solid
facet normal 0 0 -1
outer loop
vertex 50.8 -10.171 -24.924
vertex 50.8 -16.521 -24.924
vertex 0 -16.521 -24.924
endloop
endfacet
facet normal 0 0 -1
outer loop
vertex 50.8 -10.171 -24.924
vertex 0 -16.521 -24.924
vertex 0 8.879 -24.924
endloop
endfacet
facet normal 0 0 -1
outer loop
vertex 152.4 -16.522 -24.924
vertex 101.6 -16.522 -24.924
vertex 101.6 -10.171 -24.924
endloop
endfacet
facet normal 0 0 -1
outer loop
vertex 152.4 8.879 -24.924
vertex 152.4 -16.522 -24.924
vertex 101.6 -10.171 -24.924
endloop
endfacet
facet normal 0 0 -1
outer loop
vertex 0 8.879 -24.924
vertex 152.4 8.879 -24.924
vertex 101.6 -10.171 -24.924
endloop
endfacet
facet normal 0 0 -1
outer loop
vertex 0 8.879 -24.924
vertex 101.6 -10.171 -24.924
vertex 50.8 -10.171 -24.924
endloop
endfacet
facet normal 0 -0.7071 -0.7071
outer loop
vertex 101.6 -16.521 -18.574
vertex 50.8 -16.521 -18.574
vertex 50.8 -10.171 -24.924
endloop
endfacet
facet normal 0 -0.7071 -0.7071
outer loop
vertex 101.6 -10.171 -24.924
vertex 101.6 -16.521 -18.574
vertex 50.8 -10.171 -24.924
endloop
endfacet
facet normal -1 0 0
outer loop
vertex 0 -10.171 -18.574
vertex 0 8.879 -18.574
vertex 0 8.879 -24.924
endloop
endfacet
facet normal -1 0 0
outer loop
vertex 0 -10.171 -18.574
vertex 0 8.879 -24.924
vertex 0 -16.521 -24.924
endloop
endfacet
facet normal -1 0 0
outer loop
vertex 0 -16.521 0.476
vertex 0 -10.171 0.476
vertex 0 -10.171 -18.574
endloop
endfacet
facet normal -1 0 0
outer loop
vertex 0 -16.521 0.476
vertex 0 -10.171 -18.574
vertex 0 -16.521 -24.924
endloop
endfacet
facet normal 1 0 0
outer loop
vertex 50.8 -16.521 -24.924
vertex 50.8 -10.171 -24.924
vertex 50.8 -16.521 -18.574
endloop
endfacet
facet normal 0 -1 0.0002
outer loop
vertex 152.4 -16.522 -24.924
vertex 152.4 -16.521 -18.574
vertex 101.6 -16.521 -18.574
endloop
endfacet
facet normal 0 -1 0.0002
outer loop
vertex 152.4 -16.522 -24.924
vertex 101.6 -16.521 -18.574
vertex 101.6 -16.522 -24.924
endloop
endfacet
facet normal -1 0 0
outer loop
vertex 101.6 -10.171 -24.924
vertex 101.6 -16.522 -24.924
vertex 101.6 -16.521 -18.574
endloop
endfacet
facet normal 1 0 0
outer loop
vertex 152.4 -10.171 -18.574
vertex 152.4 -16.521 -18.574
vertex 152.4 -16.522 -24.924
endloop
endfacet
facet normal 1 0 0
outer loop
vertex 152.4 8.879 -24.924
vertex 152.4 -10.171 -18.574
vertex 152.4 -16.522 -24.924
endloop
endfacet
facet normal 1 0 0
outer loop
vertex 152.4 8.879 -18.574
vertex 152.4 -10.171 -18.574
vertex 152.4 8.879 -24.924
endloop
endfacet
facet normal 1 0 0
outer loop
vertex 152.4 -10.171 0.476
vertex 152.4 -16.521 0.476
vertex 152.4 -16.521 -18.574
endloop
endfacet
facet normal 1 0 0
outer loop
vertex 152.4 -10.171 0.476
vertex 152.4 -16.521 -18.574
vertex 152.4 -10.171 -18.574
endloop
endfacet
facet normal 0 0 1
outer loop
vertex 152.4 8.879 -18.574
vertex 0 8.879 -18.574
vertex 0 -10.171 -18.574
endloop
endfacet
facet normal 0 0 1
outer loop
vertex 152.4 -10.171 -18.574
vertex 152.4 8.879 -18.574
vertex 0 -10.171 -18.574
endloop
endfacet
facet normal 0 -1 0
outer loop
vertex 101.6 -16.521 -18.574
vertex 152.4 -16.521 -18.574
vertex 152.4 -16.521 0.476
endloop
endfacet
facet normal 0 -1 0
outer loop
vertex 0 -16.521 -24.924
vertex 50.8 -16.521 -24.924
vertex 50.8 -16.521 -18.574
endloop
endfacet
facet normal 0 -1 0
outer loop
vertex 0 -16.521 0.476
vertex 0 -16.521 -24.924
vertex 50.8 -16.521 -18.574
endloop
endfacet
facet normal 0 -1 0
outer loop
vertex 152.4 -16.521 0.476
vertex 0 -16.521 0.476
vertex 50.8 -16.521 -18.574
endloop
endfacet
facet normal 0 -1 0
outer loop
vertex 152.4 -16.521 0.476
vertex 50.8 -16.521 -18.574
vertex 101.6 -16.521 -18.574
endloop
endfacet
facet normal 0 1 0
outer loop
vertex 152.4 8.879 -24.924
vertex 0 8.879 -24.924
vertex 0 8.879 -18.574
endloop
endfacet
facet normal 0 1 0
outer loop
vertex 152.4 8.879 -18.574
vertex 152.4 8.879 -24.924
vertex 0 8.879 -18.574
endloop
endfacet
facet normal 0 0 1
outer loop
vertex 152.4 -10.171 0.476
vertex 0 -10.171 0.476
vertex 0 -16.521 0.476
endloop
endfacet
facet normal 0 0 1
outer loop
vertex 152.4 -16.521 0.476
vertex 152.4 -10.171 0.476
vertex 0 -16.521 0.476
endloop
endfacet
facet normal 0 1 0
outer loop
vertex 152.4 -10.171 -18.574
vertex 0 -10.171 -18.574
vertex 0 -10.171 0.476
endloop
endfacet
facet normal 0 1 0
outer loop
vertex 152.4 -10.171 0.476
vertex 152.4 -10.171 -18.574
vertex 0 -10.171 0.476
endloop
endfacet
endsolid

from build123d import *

# Parameters (mm, degrees)
F1_DEPTH = 152.4
F3_DEPTH = 154.432
F5_DEPTH = 50.8
F7_DEPTH = 50.8


with BuildPart() as f1:
    # F0 (on Right) → F1 (new body)
    with BuildSketch(Plane.YZ):
        Polygon((-10.171386, 0.476147), (-16.521386, 0.476147), (-16.521386, -24.923853), (8.878614, -24.923853), (8.878614, -18.573853), (-10.171386, -18.573853), align=None)
    extrude(amount=F1_DEPTH)

    # F2 (on face) → F3 (cut)
    with BuildSketch(Plane(origin=(0, 0, 0), x_dir=(0, -1, 0), z_dir=(-1, 0, 0))):
        Polygon((10.171386, -24.923853), (16.521386, -24.923853), (16.521386, -18.573853), align=None)
    extrude(amount=-F3_DEPTH, mode=Mode.SUBTRACT)

    # F4 (on face) → F5 (join)
    with BuildSketch(Plane(origin=(0, 0, 0), x_dir=(0, -1, 0), z_dir=(-1, 0, 0))):
        Polygon((16.521386, -24.923853), (16.521386, -18.573853), (10.171386, -24.923853), align=None)
    extrude(amount=-F5_DEPTH)

    # F6 (on face) → F7 (join)
    with BuildSketch(Plane.YZ.offset(152.4)):
        Polygon((-16.522156, -24.923853), (-10.171386, -24.923853), (-16.521386, -18.573853), align=None)
    extrude(amount=-F7_DEPTH)


solid = f1.part
